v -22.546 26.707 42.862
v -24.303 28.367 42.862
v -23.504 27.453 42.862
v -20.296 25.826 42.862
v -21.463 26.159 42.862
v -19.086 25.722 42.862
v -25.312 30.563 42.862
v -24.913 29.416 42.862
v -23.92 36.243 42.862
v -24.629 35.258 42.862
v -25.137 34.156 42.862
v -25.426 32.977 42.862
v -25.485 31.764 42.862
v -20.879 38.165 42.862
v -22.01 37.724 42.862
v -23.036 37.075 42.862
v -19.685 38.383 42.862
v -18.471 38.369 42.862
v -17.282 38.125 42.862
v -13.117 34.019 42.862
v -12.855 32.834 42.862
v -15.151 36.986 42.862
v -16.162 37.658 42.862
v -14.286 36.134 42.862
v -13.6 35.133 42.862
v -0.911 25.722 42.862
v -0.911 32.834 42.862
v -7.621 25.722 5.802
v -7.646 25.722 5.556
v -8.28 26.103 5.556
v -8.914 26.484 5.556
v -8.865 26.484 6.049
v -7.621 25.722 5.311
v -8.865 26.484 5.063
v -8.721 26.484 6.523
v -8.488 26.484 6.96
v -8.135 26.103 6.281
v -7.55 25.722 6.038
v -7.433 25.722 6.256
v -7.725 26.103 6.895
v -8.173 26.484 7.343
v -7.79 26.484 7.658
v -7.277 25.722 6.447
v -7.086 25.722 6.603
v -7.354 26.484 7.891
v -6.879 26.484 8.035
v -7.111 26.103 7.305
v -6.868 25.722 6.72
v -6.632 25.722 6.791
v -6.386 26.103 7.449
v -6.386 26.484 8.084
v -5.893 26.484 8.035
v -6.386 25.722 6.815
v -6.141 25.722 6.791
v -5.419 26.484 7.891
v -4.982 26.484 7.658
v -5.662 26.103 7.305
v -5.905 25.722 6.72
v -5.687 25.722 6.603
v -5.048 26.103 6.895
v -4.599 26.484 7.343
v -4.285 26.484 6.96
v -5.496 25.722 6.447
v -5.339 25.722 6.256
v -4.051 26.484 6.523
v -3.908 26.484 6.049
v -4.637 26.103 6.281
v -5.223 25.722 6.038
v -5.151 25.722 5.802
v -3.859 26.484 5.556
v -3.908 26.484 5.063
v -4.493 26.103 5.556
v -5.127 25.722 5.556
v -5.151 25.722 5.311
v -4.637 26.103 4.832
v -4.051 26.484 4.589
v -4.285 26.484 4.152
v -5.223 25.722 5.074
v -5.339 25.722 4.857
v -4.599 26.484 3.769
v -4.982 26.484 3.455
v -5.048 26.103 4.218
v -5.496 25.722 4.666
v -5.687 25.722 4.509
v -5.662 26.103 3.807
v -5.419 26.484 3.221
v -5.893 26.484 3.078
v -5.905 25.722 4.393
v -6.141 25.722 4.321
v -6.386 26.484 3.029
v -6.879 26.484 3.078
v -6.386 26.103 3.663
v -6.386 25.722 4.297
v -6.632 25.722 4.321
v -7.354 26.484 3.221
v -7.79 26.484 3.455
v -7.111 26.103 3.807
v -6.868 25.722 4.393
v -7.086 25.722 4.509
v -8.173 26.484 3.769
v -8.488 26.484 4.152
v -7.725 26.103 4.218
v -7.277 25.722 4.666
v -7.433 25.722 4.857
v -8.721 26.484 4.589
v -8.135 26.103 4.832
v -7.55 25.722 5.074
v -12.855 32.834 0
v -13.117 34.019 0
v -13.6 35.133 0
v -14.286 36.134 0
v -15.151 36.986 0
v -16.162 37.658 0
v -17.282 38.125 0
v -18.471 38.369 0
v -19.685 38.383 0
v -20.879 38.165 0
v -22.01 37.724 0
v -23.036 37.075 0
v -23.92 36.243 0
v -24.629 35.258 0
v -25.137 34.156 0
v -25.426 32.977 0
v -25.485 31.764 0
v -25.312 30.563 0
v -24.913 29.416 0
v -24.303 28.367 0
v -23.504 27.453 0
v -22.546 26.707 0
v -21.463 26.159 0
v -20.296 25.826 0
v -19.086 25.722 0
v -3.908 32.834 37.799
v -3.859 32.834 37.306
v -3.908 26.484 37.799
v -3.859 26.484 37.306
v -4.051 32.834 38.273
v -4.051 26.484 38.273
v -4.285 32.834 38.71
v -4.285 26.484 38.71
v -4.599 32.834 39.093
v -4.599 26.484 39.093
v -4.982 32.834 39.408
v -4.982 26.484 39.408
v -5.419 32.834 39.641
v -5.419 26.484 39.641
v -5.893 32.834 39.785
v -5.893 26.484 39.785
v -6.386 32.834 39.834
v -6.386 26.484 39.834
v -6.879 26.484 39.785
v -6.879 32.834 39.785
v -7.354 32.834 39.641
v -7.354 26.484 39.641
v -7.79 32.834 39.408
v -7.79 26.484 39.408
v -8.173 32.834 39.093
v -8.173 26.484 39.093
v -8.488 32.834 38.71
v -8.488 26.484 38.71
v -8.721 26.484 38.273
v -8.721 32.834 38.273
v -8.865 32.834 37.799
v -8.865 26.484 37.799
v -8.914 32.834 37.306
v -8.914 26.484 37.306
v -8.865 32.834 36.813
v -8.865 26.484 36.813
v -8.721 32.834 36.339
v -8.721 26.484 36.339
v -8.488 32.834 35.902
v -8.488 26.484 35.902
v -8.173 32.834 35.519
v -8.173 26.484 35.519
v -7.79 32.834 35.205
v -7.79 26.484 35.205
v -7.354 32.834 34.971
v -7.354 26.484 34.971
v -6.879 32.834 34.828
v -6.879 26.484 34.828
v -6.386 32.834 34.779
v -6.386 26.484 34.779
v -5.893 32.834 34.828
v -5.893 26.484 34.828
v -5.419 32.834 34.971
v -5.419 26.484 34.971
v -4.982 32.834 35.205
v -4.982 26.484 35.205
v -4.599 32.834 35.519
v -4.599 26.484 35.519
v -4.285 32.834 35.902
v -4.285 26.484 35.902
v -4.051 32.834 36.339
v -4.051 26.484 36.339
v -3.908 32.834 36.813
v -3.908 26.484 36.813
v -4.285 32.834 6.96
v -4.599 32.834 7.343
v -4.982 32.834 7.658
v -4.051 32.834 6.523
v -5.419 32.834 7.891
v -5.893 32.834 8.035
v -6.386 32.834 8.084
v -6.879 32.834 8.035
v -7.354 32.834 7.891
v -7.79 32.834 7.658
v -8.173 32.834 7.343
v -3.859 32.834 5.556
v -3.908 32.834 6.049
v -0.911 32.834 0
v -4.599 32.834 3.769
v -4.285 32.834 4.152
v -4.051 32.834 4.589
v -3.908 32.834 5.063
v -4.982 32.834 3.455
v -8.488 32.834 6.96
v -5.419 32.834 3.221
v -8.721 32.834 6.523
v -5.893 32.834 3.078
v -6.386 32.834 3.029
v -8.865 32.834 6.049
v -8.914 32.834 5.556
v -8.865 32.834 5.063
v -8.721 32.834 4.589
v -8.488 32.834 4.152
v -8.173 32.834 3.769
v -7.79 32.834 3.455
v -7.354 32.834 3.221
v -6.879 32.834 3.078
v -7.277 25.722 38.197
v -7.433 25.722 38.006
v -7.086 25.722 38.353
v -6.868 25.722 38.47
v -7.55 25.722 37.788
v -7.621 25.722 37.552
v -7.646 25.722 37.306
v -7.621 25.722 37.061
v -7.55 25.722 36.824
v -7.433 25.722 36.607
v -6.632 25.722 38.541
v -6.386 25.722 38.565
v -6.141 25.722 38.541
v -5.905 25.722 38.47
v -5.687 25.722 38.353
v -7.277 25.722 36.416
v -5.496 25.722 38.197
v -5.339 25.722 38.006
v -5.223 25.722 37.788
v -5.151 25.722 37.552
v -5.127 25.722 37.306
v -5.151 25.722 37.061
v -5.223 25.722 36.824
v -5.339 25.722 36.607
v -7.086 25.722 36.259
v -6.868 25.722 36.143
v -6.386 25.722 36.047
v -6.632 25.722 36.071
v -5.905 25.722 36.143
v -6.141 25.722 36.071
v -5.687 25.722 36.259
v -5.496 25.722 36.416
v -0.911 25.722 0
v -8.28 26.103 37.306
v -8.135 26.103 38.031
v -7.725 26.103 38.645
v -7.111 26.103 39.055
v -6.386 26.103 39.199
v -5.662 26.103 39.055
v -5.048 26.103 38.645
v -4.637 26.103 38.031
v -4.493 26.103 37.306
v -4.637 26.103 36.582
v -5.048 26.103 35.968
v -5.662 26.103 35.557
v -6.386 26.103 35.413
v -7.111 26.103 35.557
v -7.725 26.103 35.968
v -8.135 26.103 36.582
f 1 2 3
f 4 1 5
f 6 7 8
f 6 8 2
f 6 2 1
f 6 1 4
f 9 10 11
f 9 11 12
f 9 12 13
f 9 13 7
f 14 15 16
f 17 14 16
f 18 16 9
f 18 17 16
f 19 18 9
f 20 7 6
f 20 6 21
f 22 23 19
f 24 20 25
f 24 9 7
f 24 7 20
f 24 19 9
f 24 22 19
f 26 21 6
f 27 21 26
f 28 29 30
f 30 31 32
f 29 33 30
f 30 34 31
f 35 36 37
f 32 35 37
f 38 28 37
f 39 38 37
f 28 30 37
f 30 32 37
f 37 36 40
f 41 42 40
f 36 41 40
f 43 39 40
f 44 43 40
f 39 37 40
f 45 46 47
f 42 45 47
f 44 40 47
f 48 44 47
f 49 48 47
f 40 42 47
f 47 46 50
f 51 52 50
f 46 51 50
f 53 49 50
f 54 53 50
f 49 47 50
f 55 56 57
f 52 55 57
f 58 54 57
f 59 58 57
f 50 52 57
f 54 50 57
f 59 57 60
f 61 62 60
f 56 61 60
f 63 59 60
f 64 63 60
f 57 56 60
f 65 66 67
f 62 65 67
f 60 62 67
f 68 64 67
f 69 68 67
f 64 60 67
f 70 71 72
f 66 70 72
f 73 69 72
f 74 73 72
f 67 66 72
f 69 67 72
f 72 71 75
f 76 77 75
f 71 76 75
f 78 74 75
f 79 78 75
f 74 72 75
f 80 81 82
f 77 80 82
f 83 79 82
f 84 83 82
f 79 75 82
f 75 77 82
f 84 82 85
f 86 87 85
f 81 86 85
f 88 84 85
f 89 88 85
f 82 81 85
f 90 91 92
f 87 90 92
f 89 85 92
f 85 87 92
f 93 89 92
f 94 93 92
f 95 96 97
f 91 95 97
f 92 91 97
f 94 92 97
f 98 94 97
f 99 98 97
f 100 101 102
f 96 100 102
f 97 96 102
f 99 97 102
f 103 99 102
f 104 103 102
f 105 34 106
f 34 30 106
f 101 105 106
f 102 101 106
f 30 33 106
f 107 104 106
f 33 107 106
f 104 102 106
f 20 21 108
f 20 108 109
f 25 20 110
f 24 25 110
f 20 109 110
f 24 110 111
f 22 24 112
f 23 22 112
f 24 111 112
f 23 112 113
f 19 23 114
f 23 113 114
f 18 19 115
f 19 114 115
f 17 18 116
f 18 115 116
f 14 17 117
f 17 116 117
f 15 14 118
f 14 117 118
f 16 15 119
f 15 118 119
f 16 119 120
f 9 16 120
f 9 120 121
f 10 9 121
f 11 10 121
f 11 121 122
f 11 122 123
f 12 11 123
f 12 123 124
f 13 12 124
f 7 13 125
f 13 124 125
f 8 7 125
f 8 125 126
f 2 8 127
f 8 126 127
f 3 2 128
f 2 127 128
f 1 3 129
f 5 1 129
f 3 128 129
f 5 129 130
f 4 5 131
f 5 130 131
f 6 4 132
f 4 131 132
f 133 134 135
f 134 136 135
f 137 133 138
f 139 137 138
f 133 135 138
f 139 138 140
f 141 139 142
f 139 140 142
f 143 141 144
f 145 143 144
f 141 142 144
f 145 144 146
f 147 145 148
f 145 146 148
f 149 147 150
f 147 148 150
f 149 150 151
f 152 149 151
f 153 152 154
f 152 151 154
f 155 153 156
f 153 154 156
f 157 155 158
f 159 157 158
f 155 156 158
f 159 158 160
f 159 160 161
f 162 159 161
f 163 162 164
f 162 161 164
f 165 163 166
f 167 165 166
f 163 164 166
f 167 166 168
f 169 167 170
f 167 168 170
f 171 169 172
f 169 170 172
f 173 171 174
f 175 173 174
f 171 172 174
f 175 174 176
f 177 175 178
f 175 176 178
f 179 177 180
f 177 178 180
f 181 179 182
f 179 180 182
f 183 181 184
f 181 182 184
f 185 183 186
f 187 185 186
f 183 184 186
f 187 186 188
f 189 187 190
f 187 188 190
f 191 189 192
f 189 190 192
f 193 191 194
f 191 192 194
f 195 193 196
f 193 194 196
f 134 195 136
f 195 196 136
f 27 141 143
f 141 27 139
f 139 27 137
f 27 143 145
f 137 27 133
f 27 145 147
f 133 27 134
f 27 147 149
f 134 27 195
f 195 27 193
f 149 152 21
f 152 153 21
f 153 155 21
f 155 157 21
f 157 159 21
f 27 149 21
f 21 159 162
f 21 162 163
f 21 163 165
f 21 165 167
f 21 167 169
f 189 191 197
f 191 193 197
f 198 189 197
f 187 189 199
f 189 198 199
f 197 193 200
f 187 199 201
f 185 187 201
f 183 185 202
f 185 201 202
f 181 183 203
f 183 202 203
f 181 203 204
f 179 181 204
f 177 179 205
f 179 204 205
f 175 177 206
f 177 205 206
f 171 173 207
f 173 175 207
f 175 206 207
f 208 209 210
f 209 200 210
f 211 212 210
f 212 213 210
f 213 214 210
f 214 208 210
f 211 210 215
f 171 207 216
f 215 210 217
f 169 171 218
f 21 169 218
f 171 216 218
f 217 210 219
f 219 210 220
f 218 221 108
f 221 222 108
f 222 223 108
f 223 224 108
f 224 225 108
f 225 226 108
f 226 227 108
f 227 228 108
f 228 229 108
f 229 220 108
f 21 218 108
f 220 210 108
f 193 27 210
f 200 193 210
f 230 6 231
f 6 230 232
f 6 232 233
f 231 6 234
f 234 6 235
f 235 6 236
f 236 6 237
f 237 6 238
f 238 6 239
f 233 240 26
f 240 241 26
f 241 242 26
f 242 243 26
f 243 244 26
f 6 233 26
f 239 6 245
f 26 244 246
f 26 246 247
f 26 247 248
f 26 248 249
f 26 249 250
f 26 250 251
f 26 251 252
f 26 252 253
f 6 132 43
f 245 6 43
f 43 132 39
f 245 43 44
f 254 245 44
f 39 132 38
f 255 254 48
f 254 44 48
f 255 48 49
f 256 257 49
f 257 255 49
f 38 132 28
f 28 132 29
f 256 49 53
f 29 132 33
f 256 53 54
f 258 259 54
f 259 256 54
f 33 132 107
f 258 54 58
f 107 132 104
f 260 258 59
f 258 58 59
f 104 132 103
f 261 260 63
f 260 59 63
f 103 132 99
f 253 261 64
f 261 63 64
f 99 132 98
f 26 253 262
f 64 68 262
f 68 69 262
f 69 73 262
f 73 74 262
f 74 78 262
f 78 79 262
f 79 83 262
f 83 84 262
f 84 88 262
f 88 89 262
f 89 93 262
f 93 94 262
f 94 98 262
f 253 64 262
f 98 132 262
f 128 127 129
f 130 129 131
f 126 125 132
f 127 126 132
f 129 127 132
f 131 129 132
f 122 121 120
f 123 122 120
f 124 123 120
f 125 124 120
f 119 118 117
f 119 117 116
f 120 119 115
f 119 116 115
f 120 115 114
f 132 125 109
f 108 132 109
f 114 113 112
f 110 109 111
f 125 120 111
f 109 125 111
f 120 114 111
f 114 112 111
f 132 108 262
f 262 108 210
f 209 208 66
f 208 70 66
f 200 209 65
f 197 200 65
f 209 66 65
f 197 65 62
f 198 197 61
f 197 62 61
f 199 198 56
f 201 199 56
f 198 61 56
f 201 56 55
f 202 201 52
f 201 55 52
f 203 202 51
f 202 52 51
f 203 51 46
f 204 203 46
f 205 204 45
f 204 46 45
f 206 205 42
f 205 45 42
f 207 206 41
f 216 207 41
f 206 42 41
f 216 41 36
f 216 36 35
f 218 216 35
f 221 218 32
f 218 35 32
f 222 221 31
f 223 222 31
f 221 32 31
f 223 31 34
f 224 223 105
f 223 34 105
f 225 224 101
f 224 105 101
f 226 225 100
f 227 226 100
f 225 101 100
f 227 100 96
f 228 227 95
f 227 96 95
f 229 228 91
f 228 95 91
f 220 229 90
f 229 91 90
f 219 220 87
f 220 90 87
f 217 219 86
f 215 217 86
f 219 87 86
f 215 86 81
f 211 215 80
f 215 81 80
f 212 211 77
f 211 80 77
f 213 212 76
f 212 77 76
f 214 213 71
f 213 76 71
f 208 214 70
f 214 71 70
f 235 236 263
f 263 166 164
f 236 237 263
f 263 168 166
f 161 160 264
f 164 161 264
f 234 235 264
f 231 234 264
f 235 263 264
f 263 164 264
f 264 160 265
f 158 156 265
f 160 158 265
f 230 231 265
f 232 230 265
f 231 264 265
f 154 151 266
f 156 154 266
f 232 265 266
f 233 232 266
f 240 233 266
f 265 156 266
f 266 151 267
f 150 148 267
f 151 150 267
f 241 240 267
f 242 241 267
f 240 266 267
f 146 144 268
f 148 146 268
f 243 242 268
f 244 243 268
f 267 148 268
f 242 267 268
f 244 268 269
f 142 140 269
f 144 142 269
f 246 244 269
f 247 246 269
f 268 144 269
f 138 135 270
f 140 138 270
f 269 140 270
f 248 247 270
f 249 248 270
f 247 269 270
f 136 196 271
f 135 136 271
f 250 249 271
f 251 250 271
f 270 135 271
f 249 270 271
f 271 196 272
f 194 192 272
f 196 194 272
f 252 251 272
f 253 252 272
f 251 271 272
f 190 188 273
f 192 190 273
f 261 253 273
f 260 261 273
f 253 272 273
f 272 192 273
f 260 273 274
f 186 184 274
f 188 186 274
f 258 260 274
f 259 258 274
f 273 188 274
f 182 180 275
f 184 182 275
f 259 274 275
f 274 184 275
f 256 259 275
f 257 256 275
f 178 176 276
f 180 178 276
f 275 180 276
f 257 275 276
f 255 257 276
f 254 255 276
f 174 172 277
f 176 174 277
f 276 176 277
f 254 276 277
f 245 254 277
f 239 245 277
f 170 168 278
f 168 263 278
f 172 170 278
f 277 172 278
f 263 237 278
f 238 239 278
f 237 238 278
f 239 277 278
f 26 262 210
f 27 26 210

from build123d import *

# Parameters (mm, degrees)
BOSS_EXTRUDE1_DEPTH            = 42.8625
F_8_0_199_DIAMETER_HOLE1_D     = 5.0546
F_8_0_199_DIAMETER_HOLE1_DEPTH = 6.35
F_8_0_199_DIAMETER_HOLE1_TIP   = 1.518555042


with BuildPart() as part:
    # Sketch1 → Boss-Extrude1 (new body)
    with BuildSketch(Plane.XY):
        with BuildLine():
            Line((-19.0864, 25.721816942), (-0.91057904, 25.721816942))
            Line((-0.91057904, 25.721816942), (-0.91057904, 32.833816942))
            Line((-0.91057904, 32.833816942), (-12.854560562, 32.833816942))
            ThreePointArc((-12.854560562, 32.833816942), (-23.919686684, 36.243252538), (-19.0864, 25.721816942))
        make_face()
    extrude(amount=BOSS_EXTRUDE1_DEPTH)

    # #8 (0.199) Diameter Hole1
    with Locations(Plane(origin=(0, 32.833816942, 0), x_dir=(-1, 0, 0), z_dir=(0, 1, 0))):
        with Locations((6.3864, 37.30625), (6.3864, 5.55625)):
            Hole(F_8_0_199_DIAMETER_HOLE1_D / 2, depth=F_8_0_199_DIAMETER_HOLE1_DEPTH)
            with Locations((0, 0, -(F_8_0_199_DIAMETER_HOLE1_DEPTH + F_8_0_199_DIAMETER_HOLE1_TIP / 2))):  # 118° drill point
                Cone(0, F_8_0_199_DIAMETER_HOLE1_D / 2, F_8_0_199_DIAMETER_HOLE1_TIP, mode=Mode.SUBTRACT)


solid = part.part
